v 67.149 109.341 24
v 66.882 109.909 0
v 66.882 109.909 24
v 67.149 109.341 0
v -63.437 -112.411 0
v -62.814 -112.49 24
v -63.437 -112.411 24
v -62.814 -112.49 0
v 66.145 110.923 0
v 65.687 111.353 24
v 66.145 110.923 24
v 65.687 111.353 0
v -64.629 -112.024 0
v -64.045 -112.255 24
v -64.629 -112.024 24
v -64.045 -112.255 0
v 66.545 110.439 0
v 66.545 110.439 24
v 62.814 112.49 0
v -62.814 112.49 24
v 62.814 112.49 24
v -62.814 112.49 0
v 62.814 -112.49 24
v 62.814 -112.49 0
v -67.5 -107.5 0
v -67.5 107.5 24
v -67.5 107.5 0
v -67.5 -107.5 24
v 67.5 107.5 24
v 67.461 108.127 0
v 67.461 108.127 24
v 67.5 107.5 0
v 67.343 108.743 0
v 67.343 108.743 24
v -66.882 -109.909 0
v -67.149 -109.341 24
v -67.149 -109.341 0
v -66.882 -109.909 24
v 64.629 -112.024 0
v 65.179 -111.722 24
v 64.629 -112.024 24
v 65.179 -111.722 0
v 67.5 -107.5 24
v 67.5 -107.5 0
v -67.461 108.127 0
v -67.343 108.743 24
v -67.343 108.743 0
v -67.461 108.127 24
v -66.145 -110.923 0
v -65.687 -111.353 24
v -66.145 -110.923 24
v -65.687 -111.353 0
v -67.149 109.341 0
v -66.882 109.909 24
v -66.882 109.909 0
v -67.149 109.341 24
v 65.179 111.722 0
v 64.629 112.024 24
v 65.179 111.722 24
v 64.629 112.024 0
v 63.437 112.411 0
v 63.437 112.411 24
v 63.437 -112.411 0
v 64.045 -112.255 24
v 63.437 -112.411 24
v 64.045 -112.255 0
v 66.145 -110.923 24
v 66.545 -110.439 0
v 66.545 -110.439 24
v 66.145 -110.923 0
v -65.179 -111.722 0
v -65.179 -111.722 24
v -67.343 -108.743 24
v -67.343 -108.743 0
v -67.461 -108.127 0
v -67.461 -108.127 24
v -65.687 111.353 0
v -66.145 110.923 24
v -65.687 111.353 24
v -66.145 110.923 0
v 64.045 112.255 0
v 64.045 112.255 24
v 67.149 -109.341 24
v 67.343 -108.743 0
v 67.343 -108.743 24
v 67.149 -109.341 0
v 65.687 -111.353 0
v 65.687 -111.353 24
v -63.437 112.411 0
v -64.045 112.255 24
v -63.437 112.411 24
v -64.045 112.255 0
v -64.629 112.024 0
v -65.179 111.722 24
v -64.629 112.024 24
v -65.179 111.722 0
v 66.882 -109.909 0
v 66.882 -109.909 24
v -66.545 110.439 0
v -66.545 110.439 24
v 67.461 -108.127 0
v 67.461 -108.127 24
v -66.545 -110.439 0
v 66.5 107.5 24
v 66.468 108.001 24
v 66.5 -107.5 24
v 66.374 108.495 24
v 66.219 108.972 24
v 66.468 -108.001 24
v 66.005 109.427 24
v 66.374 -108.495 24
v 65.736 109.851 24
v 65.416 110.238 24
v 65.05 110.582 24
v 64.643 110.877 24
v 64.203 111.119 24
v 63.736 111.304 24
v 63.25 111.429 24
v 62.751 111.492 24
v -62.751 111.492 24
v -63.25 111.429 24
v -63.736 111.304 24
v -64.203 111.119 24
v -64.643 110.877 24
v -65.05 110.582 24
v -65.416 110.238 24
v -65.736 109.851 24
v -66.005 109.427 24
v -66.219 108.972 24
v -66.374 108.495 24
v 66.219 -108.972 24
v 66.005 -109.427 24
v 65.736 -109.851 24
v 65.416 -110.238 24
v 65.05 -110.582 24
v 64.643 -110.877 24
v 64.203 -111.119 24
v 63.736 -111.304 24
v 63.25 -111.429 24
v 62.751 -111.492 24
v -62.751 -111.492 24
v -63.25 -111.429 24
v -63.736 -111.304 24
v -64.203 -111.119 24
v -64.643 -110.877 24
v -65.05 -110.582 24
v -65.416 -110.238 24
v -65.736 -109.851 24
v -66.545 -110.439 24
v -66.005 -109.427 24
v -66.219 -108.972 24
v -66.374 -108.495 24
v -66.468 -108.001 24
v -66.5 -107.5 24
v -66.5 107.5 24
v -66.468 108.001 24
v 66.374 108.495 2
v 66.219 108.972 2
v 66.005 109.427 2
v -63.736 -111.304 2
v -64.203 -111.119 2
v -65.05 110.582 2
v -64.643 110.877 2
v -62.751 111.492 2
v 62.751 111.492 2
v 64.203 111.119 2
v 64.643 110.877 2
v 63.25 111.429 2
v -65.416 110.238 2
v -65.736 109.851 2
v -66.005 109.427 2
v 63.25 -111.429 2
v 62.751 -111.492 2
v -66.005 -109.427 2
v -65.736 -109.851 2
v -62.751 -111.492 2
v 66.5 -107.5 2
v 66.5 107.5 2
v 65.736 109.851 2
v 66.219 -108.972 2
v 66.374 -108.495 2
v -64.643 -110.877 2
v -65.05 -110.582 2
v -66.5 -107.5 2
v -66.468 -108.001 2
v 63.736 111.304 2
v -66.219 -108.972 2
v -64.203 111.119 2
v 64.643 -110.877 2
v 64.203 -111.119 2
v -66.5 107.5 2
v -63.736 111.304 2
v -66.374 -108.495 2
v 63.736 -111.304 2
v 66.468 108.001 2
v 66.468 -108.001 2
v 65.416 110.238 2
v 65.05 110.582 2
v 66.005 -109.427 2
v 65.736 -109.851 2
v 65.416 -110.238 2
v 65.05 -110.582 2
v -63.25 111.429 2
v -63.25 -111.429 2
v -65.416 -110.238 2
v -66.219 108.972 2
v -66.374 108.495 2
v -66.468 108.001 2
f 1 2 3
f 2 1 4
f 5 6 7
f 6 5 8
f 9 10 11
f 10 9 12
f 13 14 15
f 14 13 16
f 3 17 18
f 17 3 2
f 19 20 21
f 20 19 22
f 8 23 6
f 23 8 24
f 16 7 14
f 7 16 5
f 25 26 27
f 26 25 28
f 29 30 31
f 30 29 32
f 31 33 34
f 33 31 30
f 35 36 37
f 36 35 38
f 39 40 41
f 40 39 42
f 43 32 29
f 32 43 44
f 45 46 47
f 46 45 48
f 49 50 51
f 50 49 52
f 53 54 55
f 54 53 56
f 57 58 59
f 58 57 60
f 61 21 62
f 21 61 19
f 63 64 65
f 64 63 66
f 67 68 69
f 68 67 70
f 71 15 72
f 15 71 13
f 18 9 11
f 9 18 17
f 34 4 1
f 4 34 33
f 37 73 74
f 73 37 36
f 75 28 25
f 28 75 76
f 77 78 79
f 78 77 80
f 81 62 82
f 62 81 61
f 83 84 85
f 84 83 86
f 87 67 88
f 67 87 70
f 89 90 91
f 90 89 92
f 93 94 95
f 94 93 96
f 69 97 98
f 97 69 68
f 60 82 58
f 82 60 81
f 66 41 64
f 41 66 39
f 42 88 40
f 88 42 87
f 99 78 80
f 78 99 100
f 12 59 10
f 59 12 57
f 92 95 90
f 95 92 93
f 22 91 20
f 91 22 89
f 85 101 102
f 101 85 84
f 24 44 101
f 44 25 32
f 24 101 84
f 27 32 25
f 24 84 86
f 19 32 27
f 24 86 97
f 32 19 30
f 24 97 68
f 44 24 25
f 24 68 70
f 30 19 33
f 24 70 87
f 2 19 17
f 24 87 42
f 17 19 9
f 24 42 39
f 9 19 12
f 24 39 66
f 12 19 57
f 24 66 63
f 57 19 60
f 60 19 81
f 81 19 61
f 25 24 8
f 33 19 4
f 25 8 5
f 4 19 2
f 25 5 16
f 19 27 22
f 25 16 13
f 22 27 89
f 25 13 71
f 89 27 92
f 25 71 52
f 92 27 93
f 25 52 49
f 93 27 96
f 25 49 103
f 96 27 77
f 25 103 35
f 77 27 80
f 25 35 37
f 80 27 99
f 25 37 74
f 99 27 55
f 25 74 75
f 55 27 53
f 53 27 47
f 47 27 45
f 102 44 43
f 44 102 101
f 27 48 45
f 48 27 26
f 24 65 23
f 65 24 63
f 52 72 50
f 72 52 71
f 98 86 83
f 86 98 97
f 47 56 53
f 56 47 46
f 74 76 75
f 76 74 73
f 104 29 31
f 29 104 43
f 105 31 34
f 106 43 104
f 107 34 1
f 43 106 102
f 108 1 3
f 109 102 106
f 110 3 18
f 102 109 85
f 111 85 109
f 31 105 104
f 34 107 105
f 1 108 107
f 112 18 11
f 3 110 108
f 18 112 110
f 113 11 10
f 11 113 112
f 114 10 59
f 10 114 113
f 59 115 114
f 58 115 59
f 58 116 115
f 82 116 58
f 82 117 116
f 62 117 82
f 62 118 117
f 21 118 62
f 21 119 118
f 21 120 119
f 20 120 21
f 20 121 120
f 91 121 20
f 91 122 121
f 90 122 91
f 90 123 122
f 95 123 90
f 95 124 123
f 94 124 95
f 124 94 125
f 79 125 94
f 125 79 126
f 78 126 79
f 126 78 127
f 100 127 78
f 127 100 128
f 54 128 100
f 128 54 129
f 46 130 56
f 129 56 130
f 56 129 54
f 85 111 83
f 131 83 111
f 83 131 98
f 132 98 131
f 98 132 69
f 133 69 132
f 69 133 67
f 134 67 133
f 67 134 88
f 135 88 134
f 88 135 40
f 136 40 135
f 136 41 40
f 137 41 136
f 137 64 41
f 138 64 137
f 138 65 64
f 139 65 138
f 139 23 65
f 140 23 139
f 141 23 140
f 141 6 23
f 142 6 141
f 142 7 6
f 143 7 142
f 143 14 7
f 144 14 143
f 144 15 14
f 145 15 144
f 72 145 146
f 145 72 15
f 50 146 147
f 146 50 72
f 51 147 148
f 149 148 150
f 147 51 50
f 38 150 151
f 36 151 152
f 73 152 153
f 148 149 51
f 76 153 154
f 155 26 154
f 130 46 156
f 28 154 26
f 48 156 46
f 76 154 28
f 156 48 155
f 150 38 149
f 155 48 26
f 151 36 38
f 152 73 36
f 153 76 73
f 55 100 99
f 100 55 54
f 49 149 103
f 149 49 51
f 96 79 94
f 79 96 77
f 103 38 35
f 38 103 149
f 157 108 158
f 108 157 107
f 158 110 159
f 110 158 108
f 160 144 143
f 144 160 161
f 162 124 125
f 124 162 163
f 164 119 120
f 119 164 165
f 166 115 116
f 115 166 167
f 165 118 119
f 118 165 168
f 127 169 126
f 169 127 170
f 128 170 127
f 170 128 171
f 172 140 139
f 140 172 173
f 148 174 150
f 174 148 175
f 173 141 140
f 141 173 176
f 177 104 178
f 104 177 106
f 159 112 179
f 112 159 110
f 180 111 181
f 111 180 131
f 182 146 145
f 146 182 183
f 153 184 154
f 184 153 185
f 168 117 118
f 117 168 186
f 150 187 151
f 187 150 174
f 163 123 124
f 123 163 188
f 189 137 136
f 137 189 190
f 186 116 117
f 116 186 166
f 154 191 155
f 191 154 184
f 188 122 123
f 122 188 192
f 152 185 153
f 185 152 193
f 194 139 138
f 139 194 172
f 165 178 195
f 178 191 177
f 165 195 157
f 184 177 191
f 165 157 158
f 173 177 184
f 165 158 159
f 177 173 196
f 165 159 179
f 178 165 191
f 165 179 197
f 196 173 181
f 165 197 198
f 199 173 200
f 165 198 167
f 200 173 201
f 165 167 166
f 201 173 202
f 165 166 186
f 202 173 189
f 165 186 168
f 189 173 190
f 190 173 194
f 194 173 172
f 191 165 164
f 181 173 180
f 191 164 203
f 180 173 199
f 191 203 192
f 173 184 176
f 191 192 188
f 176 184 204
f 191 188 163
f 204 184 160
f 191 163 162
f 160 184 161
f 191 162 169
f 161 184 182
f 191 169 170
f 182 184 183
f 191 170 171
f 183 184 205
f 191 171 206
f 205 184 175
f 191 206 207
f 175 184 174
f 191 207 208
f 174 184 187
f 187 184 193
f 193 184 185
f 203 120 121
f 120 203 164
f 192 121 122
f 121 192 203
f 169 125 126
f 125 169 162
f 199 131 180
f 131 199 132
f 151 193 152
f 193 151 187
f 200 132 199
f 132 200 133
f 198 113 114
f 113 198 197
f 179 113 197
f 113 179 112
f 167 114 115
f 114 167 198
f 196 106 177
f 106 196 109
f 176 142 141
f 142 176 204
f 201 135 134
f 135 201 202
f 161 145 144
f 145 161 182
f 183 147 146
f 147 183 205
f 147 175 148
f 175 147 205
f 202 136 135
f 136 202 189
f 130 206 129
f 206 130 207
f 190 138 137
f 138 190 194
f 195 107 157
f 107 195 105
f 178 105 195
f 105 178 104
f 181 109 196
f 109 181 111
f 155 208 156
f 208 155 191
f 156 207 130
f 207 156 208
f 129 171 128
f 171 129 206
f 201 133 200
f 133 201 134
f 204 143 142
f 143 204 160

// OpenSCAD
$fn = 50;


difference() {
	union() {
		hull() {
			translate(v = [-62.5000000000, 107.5000000000, 0]) {
				cylinder(h = 24, r = 5);
			}
			translate(v = [62.5000000000, 107.5000000000, 0]) {
				cylinder(h = 24, r = 5);
			}
			translate(v = [-62.5000000000, -107.5000000000, 0]) {
				cylinder(h = 24, r = 5);
			}
			translate(v = [62.5000000000, -107.5000000000, 0]) {
				cylinder(h = 24, r = 5);
			}
		}
	}
	union() {
		translate(v = [0, 0, 2]) {
			hull() {
				translate(v = [-62.5000000000, 107.5000000000, 0]) {
					cylinder(h = 22, r = 4);
				}
				translate(v = [62.5000000000, 107.5000000000, 0]) {
					cylinder(h = 22, r = 4);
				}
				translate(v = [-62.5000000000, -107.5000000000, 0]) {
					cylinder(h = 22, r = 4);
				}
				translate(v = [62.5000000000, -107.5000000000, 0]) {
					cylinder(h = 22, r = 4);
				}
			}
		}
	}
}
